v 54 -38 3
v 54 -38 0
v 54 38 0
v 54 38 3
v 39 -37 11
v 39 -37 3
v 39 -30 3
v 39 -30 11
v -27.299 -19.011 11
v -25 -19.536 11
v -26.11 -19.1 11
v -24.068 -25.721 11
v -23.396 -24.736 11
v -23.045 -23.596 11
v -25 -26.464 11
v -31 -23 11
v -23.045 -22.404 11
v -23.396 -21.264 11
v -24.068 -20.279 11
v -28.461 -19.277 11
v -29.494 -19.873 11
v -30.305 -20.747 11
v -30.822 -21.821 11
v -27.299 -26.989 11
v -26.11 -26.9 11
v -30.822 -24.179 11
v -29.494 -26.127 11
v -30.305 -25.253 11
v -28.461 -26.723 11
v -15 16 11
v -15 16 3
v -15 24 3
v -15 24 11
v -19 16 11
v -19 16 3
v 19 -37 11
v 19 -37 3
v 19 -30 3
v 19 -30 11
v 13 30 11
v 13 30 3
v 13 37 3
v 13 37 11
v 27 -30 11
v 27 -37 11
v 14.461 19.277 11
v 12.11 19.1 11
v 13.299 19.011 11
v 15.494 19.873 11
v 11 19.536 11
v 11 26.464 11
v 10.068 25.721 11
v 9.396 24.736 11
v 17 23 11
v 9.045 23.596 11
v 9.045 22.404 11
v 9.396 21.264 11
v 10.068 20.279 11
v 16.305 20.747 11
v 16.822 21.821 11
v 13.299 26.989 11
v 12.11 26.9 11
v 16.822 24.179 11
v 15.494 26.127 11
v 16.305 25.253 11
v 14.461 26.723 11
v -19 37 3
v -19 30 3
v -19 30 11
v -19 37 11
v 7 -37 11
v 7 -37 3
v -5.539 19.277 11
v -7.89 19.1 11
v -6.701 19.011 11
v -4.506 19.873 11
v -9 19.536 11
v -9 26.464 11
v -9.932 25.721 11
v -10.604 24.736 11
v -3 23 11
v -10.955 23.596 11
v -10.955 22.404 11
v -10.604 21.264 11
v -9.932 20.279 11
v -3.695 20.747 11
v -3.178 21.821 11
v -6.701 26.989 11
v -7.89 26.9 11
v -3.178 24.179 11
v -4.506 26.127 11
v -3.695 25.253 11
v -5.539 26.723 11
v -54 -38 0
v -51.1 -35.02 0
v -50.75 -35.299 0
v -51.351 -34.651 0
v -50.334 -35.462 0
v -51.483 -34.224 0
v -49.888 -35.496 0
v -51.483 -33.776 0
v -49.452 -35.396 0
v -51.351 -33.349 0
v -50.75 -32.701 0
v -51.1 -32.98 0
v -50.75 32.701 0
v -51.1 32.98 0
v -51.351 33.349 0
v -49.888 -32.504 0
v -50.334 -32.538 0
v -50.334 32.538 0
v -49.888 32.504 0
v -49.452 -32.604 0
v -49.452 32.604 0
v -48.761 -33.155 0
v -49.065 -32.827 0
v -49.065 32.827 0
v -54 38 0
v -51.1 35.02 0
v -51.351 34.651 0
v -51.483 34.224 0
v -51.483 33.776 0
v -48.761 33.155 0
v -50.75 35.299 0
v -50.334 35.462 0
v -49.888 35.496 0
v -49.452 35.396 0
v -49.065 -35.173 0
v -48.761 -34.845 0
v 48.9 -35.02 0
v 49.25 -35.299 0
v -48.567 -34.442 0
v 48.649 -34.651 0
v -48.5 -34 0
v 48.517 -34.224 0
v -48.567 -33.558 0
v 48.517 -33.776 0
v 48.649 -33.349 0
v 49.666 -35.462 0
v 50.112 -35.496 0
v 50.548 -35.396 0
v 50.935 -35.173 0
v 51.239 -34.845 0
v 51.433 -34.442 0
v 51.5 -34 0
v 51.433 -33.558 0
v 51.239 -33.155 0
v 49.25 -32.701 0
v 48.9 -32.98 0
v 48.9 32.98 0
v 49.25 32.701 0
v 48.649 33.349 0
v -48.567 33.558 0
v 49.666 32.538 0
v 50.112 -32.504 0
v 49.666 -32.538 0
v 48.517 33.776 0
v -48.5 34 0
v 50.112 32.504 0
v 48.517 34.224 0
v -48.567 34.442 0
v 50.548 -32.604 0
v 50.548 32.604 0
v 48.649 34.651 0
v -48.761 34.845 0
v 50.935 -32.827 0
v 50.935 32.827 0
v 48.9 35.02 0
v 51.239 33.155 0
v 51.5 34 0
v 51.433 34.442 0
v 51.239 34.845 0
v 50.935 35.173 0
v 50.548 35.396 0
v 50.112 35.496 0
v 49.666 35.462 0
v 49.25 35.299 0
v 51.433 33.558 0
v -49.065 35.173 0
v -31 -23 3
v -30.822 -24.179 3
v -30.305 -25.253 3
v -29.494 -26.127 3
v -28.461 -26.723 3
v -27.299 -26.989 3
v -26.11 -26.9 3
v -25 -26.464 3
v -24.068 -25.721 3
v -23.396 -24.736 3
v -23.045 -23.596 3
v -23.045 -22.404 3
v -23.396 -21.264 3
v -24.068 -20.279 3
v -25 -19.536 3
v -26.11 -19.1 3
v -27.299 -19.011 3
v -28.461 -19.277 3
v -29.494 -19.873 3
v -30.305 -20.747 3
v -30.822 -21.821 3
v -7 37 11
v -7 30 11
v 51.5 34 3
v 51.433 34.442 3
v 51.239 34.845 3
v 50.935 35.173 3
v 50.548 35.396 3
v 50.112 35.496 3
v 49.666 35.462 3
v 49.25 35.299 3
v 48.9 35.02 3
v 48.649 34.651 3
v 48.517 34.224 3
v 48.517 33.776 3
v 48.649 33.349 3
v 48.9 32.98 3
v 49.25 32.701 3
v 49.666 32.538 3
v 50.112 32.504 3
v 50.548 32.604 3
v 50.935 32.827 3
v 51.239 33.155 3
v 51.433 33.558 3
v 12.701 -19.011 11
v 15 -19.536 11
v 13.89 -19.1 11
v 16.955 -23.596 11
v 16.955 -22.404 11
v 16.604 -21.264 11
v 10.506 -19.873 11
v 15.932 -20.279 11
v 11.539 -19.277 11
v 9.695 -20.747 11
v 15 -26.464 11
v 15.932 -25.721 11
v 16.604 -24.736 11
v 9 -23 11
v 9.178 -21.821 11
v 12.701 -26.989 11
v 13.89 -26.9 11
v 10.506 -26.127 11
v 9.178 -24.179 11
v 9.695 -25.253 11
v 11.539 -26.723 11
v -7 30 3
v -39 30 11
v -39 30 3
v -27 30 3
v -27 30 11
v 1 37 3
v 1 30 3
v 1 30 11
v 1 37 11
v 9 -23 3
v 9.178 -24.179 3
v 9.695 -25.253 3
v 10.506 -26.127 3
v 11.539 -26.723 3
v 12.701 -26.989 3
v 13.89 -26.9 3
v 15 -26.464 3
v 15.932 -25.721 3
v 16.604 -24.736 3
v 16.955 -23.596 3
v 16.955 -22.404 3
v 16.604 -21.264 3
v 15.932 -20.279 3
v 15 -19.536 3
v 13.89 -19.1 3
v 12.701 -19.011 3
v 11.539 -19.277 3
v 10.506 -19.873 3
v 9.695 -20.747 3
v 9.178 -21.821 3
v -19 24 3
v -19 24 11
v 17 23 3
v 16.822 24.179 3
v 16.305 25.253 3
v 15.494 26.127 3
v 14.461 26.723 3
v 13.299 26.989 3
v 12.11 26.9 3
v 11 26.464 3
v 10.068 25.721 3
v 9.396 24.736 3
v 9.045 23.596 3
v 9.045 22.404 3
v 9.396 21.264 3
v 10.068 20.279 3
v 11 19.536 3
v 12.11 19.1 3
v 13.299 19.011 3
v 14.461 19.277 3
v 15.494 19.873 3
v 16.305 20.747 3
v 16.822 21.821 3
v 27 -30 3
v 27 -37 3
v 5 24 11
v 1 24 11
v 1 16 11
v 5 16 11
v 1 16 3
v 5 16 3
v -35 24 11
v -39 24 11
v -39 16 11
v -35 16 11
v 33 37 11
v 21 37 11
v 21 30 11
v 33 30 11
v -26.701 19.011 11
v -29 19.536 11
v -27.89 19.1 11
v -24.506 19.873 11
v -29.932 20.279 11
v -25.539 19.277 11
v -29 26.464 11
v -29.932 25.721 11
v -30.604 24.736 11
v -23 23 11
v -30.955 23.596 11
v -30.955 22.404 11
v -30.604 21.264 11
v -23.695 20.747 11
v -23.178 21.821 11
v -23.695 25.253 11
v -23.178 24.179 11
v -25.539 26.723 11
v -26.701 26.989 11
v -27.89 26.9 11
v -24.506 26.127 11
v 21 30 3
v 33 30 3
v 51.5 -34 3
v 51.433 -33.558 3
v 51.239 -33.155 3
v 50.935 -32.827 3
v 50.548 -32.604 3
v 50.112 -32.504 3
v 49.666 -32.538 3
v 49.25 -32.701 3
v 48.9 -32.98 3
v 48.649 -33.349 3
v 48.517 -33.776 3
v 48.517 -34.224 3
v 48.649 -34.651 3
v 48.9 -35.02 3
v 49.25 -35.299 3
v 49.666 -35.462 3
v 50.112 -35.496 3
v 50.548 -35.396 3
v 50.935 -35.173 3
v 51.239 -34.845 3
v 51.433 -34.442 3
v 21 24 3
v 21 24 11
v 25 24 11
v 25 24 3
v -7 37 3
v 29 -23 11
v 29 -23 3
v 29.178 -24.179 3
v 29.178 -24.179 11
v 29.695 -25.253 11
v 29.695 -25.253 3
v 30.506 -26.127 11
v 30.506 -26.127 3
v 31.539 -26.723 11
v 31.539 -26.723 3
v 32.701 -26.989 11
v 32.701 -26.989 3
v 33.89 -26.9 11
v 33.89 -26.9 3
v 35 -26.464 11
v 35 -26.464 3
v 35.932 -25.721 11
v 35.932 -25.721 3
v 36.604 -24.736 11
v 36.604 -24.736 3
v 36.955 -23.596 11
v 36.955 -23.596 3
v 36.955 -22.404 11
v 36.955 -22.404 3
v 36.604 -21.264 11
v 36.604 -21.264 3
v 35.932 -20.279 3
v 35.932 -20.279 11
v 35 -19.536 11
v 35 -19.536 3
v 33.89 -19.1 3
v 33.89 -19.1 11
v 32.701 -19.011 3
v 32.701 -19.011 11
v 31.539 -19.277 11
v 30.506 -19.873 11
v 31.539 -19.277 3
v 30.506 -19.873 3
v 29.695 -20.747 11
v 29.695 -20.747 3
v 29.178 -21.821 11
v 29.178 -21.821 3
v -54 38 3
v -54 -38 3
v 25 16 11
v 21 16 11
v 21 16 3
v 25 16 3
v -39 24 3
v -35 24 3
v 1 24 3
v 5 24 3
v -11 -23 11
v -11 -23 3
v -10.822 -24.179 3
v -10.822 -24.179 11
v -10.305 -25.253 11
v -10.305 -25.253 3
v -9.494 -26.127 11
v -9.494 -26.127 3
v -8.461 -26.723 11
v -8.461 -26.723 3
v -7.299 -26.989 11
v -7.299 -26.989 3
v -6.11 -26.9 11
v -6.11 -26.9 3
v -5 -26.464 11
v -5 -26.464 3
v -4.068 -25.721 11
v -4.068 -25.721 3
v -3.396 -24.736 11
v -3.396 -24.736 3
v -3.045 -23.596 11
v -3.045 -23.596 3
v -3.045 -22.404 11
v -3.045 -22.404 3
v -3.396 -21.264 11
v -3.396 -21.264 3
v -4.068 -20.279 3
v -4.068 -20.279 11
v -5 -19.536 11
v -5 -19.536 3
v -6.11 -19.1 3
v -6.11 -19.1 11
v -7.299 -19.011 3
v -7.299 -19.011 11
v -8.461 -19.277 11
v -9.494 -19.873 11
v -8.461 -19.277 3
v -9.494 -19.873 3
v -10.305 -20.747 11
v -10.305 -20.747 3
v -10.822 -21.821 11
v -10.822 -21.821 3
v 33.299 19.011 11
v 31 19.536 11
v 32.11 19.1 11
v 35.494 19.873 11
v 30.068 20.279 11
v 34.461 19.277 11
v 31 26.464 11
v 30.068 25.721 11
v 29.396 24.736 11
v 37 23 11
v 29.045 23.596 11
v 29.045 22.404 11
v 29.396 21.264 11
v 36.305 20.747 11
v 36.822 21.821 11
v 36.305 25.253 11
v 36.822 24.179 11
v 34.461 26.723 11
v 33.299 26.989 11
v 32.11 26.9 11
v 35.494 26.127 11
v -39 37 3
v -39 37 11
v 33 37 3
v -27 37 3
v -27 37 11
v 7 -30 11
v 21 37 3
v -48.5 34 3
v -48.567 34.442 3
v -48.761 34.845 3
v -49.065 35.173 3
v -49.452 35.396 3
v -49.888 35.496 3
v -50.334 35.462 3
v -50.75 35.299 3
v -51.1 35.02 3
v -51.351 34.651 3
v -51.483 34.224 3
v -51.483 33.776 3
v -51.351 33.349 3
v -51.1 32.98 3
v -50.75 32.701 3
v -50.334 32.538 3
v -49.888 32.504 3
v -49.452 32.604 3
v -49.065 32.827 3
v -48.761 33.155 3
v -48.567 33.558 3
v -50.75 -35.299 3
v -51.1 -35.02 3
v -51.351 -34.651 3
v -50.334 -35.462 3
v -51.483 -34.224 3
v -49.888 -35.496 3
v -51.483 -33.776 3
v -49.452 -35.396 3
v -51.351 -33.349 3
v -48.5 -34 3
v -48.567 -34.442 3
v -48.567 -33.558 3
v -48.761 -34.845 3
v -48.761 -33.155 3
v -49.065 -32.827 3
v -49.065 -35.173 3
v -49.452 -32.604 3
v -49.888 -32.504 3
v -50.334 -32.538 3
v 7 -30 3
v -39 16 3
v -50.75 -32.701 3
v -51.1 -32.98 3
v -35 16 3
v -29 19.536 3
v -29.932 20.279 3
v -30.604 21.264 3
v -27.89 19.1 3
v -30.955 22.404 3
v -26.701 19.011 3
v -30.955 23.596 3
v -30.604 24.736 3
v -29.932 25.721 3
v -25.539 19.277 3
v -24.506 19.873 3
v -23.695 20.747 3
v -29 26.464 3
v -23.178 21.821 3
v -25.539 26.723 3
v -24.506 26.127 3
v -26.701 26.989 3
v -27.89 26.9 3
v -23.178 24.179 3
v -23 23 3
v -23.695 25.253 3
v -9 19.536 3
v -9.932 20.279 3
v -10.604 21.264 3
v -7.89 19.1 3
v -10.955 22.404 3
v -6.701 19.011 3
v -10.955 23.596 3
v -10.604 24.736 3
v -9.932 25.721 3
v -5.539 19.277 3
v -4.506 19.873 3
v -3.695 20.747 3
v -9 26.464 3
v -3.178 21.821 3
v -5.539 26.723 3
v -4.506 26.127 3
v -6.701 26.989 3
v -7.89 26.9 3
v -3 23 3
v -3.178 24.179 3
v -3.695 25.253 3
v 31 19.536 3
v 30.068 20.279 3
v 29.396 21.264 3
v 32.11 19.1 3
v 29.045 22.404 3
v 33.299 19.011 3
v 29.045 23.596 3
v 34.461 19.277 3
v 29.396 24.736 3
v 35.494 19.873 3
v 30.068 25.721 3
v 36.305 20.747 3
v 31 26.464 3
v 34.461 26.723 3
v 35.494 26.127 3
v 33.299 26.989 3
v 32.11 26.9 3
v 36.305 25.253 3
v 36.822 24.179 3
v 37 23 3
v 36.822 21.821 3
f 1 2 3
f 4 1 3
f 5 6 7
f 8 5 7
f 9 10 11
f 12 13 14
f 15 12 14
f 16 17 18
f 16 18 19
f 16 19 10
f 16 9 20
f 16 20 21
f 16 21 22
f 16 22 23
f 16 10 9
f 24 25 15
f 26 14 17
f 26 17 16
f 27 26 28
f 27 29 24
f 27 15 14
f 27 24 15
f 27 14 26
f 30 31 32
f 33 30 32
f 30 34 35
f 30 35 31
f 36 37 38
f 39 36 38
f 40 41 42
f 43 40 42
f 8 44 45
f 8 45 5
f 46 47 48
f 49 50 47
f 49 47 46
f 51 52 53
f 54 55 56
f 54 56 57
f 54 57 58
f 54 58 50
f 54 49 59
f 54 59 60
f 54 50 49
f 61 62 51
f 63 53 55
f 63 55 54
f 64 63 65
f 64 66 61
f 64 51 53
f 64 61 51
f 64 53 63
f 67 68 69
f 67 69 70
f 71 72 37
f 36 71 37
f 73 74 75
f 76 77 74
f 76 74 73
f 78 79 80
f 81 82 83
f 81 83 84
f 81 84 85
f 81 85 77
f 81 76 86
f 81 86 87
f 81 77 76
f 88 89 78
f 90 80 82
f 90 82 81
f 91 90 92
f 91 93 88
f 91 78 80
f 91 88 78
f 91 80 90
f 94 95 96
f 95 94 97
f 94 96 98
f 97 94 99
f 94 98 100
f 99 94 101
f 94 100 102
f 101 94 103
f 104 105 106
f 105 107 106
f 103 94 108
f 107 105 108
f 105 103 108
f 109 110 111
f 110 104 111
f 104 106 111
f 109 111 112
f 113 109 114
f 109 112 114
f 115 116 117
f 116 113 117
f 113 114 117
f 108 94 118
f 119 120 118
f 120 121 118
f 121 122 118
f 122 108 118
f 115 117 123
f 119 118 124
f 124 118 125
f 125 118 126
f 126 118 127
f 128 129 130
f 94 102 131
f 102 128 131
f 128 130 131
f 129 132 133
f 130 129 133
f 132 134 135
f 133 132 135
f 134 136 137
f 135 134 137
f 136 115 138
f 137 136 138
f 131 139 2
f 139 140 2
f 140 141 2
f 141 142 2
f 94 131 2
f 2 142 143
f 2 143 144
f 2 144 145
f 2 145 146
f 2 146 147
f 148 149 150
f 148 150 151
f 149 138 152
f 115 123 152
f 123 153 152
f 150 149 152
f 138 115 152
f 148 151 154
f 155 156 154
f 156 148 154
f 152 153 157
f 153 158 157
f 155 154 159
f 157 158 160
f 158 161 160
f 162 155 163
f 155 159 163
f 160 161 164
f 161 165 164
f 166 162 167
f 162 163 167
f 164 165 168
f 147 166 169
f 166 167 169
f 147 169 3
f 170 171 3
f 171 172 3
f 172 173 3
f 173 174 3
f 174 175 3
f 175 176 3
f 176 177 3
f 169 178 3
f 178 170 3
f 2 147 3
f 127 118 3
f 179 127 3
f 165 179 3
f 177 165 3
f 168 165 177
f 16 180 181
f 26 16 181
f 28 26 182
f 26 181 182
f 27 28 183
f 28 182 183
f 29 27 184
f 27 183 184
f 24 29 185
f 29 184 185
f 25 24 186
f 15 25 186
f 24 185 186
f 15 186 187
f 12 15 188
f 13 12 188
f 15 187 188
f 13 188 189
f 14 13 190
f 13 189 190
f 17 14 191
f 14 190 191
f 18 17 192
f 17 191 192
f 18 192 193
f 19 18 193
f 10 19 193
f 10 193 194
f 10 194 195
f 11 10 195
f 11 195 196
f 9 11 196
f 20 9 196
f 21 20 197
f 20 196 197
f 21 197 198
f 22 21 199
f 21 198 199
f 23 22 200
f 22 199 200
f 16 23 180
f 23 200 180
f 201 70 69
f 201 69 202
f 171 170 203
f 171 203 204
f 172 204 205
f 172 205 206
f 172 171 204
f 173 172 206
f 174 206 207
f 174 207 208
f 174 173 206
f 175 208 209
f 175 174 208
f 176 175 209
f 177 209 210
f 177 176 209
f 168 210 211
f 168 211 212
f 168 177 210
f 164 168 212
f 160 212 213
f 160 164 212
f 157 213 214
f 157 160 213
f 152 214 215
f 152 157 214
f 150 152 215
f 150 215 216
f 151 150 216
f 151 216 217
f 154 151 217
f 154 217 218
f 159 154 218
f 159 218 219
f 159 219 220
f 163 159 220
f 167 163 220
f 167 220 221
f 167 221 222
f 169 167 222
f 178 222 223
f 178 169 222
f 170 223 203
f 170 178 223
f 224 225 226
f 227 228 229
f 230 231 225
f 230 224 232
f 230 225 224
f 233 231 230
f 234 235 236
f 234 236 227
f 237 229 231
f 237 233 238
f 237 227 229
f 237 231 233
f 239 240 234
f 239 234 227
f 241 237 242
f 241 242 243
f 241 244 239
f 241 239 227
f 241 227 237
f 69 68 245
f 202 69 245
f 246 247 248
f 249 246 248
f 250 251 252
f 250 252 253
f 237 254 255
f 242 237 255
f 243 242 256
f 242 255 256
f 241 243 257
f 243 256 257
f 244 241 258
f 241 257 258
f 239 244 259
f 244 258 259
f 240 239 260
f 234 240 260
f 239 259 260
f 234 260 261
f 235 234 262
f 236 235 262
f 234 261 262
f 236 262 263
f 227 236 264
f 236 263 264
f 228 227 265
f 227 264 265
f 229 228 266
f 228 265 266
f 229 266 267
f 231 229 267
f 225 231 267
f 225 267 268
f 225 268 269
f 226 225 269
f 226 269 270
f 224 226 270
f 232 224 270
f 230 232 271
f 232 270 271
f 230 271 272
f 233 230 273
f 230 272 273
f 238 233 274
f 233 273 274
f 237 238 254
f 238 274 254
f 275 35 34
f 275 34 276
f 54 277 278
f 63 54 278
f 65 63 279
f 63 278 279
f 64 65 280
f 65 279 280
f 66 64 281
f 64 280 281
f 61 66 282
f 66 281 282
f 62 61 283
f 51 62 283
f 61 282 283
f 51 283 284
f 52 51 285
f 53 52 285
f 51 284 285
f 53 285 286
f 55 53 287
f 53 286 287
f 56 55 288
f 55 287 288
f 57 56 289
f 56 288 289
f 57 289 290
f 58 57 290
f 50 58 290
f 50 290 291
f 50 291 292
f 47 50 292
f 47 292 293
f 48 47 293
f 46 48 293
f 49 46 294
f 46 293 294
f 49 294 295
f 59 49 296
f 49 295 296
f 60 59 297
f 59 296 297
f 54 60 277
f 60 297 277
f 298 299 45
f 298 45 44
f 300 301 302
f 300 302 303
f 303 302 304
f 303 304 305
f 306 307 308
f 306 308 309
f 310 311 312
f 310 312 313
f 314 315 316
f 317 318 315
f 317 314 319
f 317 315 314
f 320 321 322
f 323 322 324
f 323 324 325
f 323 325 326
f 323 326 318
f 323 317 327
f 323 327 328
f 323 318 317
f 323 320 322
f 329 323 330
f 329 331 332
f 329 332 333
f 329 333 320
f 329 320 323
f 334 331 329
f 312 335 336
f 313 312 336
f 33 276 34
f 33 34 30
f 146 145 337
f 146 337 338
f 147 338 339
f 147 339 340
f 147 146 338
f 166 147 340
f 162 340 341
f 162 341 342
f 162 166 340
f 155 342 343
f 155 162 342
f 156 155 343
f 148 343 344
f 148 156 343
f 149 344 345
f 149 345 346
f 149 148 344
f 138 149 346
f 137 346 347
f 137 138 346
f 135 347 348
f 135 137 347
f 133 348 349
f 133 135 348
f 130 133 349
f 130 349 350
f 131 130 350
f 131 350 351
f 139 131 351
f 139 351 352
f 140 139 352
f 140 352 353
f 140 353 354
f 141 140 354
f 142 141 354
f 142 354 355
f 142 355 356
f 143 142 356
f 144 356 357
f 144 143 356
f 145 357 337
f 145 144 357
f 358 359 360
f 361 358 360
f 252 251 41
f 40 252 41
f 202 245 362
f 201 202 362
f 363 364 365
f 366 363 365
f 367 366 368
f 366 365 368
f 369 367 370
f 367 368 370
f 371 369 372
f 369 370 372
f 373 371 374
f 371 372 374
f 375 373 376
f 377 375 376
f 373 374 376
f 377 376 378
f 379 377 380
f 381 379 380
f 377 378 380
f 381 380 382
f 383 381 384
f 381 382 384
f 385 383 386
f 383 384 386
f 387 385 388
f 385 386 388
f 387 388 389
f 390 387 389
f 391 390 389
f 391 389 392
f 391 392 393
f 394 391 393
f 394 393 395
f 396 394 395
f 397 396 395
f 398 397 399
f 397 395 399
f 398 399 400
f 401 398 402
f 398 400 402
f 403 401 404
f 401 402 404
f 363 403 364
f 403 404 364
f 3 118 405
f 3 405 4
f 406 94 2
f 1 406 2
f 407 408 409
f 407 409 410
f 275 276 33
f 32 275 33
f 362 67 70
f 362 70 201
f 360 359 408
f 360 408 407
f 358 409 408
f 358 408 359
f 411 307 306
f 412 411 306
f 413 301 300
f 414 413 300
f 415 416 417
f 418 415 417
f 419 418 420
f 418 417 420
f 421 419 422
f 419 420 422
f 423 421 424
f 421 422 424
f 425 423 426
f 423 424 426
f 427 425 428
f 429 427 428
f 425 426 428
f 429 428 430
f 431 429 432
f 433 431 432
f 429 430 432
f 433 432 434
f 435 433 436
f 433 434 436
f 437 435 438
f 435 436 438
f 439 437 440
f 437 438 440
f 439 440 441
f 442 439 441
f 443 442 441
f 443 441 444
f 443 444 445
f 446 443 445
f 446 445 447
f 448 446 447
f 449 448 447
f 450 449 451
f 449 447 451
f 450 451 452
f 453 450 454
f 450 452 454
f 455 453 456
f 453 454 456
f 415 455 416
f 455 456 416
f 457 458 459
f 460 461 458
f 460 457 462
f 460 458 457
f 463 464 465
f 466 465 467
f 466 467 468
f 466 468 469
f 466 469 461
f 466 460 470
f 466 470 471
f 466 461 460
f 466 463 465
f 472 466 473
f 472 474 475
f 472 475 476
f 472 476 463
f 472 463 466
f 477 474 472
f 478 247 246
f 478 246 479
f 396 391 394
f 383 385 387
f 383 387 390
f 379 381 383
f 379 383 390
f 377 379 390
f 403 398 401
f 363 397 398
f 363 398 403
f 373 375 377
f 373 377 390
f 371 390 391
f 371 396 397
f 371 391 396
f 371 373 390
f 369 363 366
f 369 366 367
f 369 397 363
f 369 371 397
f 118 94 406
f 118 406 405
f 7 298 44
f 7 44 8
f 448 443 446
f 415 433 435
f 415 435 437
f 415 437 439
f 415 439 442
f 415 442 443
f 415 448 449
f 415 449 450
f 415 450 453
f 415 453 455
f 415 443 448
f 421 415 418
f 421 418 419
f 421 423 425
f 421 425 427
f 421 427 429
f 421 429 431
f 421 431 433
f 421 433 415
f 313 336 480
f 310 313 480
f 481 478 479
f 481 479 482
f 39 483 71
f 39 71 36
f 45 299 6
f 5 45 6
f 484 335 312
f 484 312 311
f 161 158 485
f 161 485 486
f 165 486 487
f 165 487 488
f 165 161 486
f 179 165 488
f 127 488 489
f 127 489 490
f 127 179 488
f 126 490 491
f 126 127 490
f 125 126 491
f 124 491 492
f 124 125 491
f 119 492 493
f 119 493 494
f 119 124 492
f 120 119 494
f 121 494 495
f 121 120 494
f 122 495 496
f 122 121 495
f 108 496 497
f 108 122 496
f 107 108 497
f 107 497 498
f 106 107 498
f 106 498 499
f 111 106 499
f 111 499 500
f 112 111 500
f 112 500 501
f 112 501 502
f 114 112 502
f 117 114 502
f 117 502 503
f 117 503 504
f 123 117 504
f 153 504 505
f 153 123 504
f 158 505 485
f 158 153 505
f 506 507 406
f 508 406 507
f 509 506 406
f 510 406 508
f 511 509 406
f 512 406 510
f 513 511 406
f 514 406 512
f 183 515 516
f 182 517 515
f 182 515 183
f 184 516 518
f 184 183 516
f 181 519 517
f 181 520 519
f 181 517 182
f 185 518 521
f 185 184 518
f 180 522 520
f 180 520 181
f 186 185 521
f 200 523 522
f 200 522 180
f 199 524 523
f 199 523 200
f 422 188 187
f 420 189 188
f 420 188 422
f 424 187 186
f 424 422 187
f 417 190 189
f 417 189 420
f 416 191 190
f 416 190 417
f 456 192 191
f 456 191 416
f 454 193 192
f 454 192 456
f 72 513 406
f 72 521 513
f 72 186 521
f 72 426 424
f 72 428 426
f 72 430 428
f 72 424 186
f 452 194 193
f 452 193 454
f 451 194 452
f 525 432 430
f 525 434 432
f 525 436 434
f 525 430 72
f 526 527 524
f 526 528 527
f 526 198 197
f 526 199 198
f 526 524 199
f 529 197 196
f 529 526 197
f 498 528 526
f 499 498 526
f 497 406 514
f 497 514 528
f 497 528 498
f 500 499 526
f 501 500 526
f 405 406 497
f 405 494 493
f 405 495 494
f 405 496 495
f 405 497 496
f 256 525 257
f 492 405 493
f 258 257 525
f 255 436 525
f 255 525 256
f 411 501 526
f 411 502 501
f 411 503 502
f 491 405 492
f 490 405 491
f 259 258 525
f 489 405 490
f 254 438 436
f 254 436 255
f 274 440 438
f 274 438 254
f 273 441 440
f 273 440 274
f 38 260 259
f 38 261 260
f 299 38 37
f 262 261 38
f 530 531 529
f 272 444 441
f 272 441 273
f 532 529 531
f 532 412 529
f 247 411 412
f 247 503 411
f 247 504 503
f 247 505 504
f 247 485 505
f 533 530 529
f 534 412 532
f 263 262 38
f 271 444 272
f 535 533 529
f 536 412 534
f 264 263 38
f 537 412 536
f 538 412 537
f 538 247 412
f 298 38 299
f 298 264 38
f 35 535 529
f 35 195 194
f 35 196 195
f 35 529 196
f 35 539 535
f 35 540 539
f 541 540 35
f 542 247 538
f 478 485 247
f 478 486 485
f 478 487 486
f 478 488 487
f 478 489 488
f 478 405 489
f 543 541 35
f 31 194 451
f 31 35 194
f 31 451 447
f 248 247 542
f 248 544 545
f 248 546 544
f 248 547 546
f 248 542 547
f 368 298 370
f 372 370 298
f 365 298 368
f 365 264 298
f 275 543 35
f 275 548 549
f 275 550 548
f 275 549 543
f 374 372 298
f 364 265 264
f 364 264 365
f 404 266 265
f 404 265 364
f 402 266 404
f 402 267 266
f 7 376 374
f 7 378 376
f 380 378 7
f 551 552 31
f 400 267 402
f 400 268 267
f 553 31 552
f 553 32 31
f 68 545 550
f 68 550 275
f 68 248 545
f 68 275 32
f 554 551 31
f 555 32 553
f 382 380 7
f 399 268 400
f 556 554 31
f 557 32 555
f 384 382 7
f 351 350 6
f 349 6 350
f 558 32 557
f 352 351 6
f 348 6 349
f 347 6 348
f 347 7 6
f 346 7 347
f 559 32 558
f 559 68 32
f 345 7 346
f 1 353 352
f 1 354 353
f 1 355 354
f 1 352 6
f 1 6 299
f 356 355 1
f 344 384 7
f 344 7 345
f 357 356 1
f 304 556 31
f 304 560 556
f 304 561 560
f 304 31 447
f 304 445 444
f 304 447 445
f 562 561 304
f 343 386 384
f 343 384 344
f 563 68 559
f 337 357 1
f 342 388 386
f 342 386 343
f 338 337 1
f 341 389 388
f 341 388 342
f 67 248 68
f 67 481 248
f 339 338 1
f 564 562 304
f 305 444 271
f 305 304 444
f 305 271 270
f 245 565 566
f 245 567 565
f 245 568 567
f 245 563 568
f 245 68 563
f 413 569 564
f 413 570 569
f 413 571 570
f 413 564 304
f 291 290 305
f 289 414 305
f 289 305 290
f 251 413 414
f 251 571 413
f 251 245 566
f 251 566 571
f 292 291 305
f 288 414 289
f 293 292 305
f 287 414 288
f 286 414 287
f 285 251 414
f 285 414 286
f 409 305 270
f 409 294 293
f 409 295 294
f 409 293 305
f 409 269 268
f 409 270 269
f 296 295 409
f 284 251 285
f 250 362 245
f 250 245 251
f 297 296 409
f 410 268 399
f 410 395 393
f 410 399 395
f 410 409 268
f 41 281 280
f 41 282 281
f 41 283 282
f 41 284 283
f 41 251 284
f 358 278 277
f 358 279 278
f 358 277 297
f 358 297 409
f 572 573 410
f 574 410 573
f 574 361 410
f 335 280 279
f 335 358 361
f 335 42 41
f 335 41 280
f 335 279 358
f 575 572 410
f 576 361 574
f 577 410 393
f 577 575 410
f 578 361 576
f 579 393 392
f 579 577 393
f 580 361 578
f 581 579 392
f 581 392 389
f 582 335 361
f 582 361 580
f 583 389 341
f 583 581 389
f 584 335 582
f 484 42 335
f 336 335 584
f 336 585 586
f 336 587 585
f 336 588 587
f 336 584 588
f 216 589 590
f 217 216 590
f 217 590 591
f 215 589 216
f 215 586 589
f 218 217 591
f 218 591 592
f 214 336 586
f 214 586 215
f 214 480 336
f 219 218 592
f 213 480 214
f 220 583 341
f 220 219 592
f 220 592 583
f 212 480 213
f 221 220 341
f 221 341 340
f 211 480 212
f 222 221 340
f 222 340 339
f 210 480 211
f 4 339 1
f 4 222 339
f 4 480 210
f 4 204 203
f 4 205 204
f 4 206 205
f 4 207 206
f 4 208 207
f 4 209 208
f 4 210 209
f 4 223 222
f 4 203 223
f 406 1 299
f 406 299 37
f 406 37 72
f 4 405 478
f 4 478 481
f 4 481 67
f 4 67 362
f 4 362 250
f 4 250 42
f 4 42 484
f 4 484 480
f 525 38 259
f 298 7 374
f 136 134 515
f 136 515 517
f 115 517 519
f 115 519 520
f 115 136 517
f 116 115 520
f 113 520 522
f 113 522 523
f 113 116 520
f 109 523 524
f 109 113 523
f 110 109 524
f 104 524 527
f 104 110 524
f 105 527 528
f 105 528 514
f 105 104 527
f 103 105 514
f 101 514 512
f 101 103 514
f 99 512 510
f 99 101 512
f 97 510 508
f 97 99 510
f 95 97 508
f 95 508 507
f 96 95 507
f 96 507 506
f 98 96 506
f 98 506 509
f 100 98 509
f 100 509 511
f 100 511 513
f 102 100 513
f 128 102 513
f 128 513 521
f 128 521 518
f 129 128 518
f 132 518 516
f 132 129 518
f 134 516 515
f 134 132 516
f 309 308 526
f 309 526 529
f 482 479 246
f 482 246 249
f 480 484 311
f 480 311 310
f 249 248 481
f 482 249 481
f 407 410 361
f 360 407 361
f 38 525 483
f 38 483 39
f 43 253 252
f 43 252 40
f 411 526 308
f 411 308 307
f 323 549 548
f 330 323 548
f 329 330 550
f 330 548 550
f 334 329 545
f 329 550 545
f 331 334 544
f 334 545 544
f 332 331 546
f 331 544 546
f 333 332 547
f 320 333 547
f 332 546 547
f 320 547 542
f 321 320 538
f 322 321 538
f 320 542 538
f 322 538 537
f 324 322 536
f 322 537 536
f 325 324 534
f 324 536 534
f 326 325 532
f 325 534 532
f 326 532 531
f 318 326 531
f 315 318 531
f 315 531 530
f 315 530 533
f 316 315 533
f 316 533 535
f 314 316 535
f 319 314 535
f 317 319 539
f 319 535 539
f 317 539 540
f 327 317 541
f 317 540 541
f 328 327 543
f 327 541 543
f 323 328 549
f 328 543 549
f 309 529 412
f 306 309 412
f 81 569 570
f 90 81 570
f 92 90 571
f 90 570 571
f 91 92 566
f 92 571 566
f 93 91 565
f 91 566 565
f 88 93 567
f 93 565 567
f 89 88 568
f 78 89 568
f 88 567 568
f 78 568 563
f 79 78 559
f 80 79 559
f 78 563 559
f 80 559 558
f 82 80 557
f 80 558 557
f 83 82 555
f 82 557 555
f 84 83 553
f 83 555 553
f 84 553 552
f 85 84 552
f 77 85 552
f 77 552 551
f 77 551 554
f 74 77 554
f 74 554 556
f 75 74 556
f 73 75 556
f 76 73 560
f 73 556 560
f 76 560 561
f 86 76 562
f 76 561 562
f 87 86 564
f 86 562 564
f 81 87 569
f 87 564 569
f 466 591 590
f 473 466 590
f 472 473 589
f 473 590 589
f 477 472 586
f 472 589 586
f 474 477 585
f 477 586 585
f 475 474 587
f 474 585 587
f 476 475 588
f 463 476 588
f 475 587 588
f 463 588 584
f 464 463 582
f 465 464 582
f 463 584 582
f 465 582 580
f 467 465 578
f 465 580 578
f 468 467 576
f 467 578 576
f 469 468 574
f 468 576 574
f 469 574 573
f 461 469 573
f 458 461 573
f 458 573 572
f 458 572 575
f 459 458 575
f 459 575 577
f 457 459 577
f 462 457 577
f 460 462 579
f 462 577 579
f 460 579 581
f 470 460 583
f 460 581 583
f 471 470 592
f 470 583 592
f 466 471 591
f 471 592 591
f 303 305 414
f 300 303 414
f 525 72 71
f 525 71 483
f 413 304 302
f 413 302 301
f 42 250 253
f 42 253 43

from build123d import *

# Parameters (mm, degrees)
SKETCH_1_W      = 108
SKETCH_1_H      = 76
SKETCH_1_R      = 1.5
EXTRUDE_1_DEPTH = 3
SKETCH_2_R      = 4
SKETCH_2_W      = 12
SKETCH_2_H      = 7
SKETCH_2_W_2    = 4
SKETCH_2_H_2    = 8
EXTRUDE_2_DEPTH = 8


with BuildPart() as part:
    # 草图1 → 凸台-拉伸1 (new body)
    with BuildSketch(Plane.XY):
        Rectangle(SKETCH_1_W, SKETCH_1_H)
        with Locations((-50, 34)):
            Circle(SKETCH_1_R, mode=Mode.SUBTRACT)
        with Locations((50, 34)):
            Circle(SKETCH_1_R, mode=Mode.SUBTRACT)
        with Locations((50, -34)):
            Circle(SKETCH_1_R, mode=Mode.SUBTRACT)
        with Locations((-50, -34)):
            Circle(SKETCH_1_R, mode=Mode.SUBTRACT)
    extrude(amount=EXTRUDE_1_DEPTH)

    # 草图2 → 凸台-拉伸2 (add)
    with BuildSketch(Plane.XY.offset(3)):
        with Locations((-27, 23)):
            Circle(SKETCH_2_R)
        with Locations((-7, 23)):
            Circle(SKETCH_2_R)
        with Locations((13, 23)):
            Circle(SKETCH_2_R)
        with Locations((33, 23)):
            Circle(SKETCH_2_R)
        with Locations(Location((33, -23, 0), (0, 0, 180))):
            Circle(SKETCH_2_R)
        with Locations(Location((13, -23, 0), (0, 0, 180))):
            Circle(SKETCH_2_R)
        with Locations(Location((-7, -23, 0), (0, 0, 180))):
            Circle(SKETCH_2_R)
        with Locations(Location((-27, -23, 0), (0, 0, 180))):
            Circle(SKETCH_2_R)
        with Locations((-33, 33.5)):
            Rectangle(SKETCH_2_W, SKETCH_2_H)
        with Locations((-13, 33.5)):
            Rectangle(SKETCH_2_W, SKETCH_2_H)
        with Locations((7, 33.5)):
            Rectangle(SKETCH_2_W, SKETCH_2_H)
        with Locations((27, 33.5)):
            Rectangle(SKETCH_2_W, SKETCH_2_H)
        with Locations((-37, 20)):
            Rectangle(SKETCH_2_W_2, SKETCH_2_H_2)
        with Locations((-17, 20)):
            Rectangle(SKETCH_2_W_2, SKETCH_2_H_2)
        with Locations((3, 20)):
            Rectangle(SKETCH_2_W_2, SKETCH_2_H_2)
        with Locations((23, 20)):
            Rectangle(SKETCH_2_W_2, SKETCH_2_H_2)
        with Locations((33, -33.5)):
            Rectangle(SKETCH_2_W, SKETCH_2_H)
        with Locations((13, -33.5)):
            Rectangle(SKETCH_2_W, SKETCH_2_H)
    extrude(amount=EXTRUDE_2_DEPTH)


solid = part.part
